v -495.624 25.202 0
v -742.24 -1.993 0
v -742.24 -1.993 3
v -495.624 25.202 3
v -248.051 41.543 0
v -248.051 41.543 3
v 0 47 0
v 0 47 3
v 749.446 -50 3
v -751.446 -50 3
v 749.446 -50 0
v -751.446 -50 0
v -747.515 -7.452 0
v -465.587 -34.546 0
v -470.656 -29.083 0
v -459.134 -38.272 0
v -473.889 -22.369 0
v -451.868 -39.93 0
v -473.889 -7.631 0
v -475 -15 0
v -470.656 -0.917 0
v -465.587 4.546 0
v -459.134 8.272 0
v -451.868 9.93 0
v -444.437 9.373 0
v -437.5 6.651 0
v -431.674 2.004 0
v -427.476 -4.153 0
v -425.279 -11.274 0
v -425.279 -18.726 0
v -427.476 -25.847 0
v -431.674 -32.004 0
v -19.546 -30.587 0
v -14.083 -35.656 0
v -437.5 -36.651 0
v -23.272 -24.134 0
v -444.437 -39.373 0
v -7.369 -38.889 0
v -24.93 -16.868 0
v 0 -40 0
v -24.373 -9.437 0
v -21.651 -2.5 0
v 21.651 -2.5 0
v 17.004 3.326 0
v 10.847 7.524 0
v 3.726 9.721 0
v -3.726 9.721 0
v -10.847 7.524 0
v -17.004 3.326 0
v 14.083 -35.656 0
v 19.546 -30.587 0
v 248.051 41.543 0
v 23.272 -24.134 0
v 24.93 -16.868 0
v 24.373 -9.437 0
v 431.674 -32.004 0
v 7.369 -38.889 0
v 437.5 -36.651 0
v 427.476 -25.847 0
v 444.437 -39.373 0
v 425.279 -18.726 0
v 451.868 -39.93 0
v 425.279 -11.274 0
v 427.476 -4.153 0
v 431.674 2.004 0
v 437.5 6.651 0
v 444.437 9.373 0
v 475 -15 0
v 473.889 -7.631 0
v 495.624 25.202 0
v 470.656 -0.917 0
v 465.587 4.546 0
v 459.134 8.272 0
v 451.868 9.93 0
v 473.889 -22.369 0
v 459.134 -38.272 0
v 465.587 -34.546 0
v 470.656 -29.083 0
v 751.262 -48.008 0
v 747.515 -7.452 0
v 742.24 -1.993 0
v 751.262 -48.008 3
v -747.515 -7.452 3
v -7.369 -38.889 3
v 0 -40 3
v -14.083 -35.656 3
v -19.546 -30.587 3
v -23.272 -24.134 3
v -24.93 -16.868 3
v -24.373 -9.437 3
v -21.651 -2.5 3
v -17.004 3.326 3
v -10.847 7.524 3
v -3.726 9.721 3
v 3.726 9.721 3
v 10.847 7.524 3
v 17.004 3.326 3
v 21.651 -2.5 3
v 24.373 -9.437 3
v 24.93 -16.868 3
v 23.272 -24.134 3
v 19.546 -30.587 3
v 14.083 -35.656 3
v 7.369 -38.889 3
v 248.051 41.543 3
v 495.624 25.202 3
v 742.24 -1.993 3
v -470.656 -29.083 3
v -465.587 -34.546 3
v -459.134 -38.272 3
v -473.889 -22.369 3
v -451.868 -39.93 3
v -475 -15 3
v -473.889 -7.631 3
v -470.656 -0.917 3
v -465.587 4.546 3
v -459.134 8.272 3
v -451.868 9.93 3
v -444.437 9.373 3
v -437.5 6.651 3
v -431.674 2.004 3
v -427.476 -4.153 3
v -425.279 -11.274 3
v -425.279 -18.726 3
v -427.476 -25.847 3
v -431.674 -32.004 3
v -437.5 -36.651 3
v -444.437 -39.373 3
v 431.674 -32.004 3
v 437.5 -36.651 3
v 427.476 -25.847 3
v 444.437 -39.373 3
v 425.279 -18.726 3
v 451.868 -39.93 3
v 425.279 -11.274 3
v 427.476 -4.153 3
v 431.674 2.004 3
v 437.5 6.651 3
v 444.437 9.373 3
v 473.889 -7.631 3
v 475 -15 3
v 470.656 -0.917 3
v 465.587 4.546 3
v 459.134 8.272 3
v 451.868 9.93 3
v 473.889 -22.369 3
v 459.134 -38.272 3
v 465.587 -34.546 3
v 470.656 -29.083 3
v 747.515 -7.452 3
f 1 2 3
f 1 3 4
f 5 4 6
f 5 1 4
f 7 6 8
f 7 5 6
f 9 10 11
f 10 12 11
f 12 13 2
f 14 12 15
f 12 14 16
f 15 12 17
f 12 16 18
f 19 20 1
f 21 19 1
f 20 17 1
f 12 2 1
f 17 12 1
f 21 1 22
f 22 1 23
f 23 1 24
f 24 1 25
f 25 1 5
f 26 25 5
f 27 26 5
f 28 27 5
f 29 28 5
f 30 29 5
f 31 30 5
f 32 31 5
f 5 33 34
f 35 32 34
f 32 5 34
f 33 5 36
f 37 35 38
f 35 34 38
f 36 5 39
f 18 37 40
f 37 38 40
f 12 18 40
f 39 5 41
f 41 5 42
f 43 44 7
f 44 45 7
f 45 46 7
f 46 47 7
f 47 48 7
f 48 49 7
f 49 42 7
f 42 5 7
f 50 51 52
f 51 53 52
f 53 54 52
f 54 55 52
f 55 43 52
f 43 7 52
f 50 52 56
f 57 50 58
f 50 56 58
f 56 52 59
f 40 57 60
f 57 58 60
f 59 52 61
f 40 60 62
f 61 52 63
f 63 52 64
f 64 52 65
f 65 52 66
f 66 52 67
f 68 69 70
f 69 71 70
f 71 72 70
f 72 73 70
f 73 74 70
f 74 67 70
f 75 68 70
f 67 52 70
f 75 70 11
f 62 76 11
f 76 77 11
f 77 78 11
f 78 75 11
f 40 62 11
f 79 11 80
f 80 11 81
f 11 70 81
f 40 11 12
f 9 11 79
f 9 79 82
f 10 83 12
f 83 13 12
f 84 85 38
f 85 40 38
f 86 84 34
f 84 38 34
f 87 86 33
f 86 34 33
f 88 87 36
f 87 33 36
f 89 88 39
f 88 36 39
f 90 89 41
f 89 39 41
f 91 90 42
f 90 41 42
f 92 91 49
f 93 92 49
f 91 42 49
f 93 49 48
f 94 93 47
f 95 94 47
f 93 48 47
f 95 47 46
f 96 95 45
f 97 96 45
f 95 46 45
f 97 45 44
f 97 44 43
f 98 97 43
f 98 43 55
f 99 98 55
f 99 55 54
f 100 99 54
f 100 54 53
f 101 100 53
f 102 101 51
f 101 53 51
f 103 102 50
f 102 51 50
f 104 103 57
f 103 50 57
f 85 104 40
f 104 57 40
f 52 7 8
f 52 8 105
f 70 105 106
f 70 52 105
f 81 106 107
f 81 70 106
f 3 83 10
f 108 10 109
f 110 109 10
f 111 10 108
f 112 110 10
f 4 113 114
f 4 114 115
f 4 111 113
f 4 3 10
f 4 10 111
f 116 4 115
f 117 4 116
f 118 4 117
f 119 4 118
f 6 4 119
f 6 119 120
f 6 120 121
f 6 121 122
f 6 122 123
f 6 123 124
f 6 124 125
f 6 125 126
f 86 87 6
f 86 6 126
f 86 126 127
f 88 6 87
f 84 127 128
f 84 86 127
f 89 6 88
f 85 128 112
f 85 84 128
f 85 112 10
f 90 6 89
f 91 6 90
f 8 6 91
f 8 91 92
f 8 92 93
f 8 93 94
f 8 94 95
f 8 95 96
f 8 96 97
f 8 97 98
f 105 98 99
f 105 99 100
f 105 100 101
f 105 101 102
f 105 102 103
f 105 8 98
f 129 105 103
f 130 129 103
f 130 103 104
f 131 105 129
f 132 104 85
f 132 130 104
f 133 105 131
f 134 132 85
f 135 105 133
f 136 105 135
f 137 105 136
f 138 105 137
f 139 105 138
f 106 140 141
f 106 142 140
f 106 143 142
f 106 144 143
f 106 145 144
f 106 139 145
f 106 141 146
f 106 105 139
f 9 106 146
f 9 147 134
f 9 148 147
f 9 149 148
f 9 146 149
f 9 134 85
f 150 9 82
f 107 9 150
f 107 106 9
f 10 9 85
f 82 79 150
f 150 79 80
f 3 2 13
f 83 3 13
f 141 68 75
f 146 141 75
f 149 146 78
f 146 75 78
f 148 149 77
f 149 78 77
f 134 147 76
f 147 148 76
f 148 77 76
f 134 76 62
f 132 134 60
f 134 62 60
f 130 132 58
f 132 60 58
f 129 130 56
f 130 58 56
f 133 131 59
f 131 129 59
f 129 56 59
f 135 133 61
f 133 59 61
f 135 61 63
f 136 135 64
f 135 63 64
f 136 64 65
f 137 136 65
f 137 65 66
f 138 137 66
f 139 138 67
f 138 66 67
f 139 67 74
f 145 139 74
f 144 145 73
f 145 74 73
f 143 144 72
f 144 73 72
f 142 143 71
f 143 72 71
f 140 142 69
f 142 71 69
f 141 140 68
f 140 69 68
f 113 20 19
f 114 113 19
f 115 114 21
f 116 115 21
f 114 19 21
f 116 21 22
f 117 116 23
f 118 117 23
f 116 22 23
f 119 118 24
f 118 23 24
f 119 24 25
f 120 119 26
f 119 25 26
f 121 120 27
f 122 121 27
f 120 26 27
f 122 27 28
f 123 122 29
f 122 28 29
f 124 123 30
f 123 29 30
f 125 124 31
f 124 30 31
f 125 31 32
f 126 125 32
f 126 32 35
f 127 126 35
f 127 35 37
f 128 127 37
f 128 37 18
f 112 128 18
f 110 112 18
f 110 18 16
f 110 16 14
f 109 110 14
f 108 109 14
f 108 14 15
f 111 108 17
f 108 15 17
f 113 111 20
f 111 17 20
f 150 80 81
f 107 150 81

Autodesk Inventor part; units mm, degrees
ref_plane "YZ Plane" through (0, 0, 0) normal (1, 0, 0) x (0, 1, 0)
ref_plane "XZ Plane" through (0, 0, 0) normal (0, 1, 0) x (-1, 0, 0)
ref_plane "XY Plane" through (0, 0, 0) normal (0, 0, 1) x (1, 0, 0)
sketch "Sketch1" plane through (0, 0, 0) normal (0, 0, 1) x (1, 0, 0)
  line L0 (-750, 0) -> (750, 0) construction
  line L1 (750, 0) -> (750, -2700) construction
  line L2 (750, -2700) -> (-750, -2700) construction
  line L3 (-750, -2700) -> (-750, 0) construction
  line L4 (800, 50) -> (-800, 50) construction
  line L5 (-800, 50) -> (-800, -2750) construction
  line L6 (-800, -2750) -> (800, -2750) construction
  line L7 (800, -2750) -> (800, 50) construction
  line L8 (-850, 100) -> (850, 100) construction
  line L9 (850, 100) -> (850, -2800) construction
  line L10 (850, -2800) -> (-850, -2800) construction
  line L11 (-850, -2800) -> (-850, 100) construction
  arc A0 (750, 0) -> (745.2706, 0.6314) centre (0, -5600) ccw construction
  line L12 (-750, -2100) -> (750, -2100) construction
  line L13 (114.1118, -2698.3696) -> (750, -2100) construction
  arc A1 (750, -2100) -> (771.0671, -250.888) centre (-10250, -1050) ccw construction
  line L14 (750, 0) -> (749.6018, -2.9735) construction
  arc A2 (750, -3.0268) -> (0, 47) centre (-0.2, -5603) ccw
  line L15 (750, 0) -> (747.0136, -0.2851) construction
  arc A3 (768.075, -251.105) -> (747.4657, -5.0326) centre (-10252.9897, -1050.251) ccw construction
  arc A4 (750.4522, -4.7486) -> (745.2706, 0.6314) centre (744.4791, -5.3162) ccw construction
  arc A5 (747.4657, -5.0326) -> (744.8748, -2.3426) centre (744.4792, -5.3164) ccw construction
  line L16 (750, -2100) -> (752.9864, -2100.2851) construction
  arc A6 (752.9864, -2100.2851) -> (772.2226, -225.7318) centre (-10246.9893, -1050.0309) ccw construction
  line L17 (750, -2100) -> (752.0559, -2102.1848) construction
  line L18 (752.0559, -2102.1848) -> (752.0559, -2102.1848) construction
  arc A7 (749.1768, -2100.7746) -> (750.1074, -2098.8746) centre (747.1209, -2098.5898) ccw construction
  line L19 (0, -2697) -> (110, -2697) construction
  line L20 (112.0559, -2696.1848) -> (676.8655, -2164.7001) construction
  arc A8 (110, -2700) -> (114.1118, -2698.3696) centre (110, -2694) ccw construction
  arc A9 (110, -2697) -> (112.0559, -2696.1848) centre (110, -2694) ccw construction
  line L21 (676.8655, -2164.7001) -> (678.9214, -2166.8849) construction
  line L22 (752.0559, -2102.1848) -> (662.7706, -2186.2021) construction
  line L23 (662.7706, -2186.2021) -> (660.7147, -2184.0173) construction
  arc A10 (747.4657, -5.0326) -> (747.0136, -0.2851) centre (-10252.9897, -1050.251) ccw construction
  arc A11 (745.2706, 0.6314) -> (0, 50) centre (0, -5600) ccw construction
  arc A12 (750.4522, -4.7486) -> (750, 0) centre (-10250, -1050) ccw construction
  line L24 (771.0671, -250.888) -> (768.075, -251.105) construction
  line L25 (769.231, -225.9556) -> (772.2226, -225.7318) construction
  arc A13 (771.0671, -250.888) -> (750.4522, -4.7486) centre (-10250, -1050) ccw construction
  line L26 (0, 100) -> (0, 50) construction
  line L27 (0, -2700) -> (0, -2697) construction
  line L28 (0, 47) -> (0, 0) construction
  line L29 (0, 50) -> (0, 47) construction
  arc A14 (752.0559, -2102.1848) -> (752.9864, -2100.2851) centre (749.9998, -2099.9999) ccw construction
  line L30 (0, 47) -> (0, -50)
  line L31 (0, -50) -> (751.6456, -50)
  circle A15 centre (450, -15) radius 25
  arc A16 (0, -40) -> (0, 10) centre (0, -15) ccw
  line L32 (747.7149, -7.6588) -> (742.2399, -1.9927)
  line L33 (751.4456, -50) -> (747.5149, -7.4518)
  point P0 (0, -2750)
  point P1 (0, 48.5)
  point P2 (747.2399, -2.6588)
  dimension "d85" = 40
  dimension "d54" = 1500
  dimension "d55" = 2700
  dimension "d58" = 2100
  dimension "d68" = 6
  dimension "d70" = 3
  dimension "d75" = 3
  dimension "d83" = 6
  dimension "d86" = 3
  dimension "d112" = 251.771
  dimension "d113" = 50
  dimension "d114" = 50
  dimension "d115" = 3
  dimension "d117" = 110
  dimension "d118" = 25
  dimension "d119" = 122.6
  dimension "d120" = 25
  dimension "d121" = 50
  dimension "d122" = 50
  dimension "d123" = 450
  dimension "d124" = 35
  dimension "d126" = 98.5
  dimension "d127" = 5
  dimension "d128" = 5
  dimension "d132" = 0.2
  dimension "d133" = 0.2
extrude "Plate3" add sketch "Sketch1" along normal blind 3 contours L32 L33 L31 L30 A16 A2
mirror "Mirror3" about plane through (0, 0, 0) normal (1, 0, 0)
chamfer "Corner Chamfer2" distance 2 angle 45 1 edges at (751.4456, -50, 1.5)
equation "\"BendRadius\" = Thickness"
equation "\"BendReliefWidth\" = Thickness"
equation "\"BendReliefDepth\" = 0.5 * Thickness"
equation "\"CornerReliefSize\" = 4 * Thickness"
equation "\"MinimumRemnant\" = 2 * Thickness"
equation "\"TransitionRadius\" = BendRadius"
equation "\"JacobiRadiusSize\" = BendRadius"
equation "\"GapSize\" = Thickness"
equation "\"Thickness\" = 3"
properties part number "MSC 208 sheet back mould" material "Stainless Steel AISI 304"
